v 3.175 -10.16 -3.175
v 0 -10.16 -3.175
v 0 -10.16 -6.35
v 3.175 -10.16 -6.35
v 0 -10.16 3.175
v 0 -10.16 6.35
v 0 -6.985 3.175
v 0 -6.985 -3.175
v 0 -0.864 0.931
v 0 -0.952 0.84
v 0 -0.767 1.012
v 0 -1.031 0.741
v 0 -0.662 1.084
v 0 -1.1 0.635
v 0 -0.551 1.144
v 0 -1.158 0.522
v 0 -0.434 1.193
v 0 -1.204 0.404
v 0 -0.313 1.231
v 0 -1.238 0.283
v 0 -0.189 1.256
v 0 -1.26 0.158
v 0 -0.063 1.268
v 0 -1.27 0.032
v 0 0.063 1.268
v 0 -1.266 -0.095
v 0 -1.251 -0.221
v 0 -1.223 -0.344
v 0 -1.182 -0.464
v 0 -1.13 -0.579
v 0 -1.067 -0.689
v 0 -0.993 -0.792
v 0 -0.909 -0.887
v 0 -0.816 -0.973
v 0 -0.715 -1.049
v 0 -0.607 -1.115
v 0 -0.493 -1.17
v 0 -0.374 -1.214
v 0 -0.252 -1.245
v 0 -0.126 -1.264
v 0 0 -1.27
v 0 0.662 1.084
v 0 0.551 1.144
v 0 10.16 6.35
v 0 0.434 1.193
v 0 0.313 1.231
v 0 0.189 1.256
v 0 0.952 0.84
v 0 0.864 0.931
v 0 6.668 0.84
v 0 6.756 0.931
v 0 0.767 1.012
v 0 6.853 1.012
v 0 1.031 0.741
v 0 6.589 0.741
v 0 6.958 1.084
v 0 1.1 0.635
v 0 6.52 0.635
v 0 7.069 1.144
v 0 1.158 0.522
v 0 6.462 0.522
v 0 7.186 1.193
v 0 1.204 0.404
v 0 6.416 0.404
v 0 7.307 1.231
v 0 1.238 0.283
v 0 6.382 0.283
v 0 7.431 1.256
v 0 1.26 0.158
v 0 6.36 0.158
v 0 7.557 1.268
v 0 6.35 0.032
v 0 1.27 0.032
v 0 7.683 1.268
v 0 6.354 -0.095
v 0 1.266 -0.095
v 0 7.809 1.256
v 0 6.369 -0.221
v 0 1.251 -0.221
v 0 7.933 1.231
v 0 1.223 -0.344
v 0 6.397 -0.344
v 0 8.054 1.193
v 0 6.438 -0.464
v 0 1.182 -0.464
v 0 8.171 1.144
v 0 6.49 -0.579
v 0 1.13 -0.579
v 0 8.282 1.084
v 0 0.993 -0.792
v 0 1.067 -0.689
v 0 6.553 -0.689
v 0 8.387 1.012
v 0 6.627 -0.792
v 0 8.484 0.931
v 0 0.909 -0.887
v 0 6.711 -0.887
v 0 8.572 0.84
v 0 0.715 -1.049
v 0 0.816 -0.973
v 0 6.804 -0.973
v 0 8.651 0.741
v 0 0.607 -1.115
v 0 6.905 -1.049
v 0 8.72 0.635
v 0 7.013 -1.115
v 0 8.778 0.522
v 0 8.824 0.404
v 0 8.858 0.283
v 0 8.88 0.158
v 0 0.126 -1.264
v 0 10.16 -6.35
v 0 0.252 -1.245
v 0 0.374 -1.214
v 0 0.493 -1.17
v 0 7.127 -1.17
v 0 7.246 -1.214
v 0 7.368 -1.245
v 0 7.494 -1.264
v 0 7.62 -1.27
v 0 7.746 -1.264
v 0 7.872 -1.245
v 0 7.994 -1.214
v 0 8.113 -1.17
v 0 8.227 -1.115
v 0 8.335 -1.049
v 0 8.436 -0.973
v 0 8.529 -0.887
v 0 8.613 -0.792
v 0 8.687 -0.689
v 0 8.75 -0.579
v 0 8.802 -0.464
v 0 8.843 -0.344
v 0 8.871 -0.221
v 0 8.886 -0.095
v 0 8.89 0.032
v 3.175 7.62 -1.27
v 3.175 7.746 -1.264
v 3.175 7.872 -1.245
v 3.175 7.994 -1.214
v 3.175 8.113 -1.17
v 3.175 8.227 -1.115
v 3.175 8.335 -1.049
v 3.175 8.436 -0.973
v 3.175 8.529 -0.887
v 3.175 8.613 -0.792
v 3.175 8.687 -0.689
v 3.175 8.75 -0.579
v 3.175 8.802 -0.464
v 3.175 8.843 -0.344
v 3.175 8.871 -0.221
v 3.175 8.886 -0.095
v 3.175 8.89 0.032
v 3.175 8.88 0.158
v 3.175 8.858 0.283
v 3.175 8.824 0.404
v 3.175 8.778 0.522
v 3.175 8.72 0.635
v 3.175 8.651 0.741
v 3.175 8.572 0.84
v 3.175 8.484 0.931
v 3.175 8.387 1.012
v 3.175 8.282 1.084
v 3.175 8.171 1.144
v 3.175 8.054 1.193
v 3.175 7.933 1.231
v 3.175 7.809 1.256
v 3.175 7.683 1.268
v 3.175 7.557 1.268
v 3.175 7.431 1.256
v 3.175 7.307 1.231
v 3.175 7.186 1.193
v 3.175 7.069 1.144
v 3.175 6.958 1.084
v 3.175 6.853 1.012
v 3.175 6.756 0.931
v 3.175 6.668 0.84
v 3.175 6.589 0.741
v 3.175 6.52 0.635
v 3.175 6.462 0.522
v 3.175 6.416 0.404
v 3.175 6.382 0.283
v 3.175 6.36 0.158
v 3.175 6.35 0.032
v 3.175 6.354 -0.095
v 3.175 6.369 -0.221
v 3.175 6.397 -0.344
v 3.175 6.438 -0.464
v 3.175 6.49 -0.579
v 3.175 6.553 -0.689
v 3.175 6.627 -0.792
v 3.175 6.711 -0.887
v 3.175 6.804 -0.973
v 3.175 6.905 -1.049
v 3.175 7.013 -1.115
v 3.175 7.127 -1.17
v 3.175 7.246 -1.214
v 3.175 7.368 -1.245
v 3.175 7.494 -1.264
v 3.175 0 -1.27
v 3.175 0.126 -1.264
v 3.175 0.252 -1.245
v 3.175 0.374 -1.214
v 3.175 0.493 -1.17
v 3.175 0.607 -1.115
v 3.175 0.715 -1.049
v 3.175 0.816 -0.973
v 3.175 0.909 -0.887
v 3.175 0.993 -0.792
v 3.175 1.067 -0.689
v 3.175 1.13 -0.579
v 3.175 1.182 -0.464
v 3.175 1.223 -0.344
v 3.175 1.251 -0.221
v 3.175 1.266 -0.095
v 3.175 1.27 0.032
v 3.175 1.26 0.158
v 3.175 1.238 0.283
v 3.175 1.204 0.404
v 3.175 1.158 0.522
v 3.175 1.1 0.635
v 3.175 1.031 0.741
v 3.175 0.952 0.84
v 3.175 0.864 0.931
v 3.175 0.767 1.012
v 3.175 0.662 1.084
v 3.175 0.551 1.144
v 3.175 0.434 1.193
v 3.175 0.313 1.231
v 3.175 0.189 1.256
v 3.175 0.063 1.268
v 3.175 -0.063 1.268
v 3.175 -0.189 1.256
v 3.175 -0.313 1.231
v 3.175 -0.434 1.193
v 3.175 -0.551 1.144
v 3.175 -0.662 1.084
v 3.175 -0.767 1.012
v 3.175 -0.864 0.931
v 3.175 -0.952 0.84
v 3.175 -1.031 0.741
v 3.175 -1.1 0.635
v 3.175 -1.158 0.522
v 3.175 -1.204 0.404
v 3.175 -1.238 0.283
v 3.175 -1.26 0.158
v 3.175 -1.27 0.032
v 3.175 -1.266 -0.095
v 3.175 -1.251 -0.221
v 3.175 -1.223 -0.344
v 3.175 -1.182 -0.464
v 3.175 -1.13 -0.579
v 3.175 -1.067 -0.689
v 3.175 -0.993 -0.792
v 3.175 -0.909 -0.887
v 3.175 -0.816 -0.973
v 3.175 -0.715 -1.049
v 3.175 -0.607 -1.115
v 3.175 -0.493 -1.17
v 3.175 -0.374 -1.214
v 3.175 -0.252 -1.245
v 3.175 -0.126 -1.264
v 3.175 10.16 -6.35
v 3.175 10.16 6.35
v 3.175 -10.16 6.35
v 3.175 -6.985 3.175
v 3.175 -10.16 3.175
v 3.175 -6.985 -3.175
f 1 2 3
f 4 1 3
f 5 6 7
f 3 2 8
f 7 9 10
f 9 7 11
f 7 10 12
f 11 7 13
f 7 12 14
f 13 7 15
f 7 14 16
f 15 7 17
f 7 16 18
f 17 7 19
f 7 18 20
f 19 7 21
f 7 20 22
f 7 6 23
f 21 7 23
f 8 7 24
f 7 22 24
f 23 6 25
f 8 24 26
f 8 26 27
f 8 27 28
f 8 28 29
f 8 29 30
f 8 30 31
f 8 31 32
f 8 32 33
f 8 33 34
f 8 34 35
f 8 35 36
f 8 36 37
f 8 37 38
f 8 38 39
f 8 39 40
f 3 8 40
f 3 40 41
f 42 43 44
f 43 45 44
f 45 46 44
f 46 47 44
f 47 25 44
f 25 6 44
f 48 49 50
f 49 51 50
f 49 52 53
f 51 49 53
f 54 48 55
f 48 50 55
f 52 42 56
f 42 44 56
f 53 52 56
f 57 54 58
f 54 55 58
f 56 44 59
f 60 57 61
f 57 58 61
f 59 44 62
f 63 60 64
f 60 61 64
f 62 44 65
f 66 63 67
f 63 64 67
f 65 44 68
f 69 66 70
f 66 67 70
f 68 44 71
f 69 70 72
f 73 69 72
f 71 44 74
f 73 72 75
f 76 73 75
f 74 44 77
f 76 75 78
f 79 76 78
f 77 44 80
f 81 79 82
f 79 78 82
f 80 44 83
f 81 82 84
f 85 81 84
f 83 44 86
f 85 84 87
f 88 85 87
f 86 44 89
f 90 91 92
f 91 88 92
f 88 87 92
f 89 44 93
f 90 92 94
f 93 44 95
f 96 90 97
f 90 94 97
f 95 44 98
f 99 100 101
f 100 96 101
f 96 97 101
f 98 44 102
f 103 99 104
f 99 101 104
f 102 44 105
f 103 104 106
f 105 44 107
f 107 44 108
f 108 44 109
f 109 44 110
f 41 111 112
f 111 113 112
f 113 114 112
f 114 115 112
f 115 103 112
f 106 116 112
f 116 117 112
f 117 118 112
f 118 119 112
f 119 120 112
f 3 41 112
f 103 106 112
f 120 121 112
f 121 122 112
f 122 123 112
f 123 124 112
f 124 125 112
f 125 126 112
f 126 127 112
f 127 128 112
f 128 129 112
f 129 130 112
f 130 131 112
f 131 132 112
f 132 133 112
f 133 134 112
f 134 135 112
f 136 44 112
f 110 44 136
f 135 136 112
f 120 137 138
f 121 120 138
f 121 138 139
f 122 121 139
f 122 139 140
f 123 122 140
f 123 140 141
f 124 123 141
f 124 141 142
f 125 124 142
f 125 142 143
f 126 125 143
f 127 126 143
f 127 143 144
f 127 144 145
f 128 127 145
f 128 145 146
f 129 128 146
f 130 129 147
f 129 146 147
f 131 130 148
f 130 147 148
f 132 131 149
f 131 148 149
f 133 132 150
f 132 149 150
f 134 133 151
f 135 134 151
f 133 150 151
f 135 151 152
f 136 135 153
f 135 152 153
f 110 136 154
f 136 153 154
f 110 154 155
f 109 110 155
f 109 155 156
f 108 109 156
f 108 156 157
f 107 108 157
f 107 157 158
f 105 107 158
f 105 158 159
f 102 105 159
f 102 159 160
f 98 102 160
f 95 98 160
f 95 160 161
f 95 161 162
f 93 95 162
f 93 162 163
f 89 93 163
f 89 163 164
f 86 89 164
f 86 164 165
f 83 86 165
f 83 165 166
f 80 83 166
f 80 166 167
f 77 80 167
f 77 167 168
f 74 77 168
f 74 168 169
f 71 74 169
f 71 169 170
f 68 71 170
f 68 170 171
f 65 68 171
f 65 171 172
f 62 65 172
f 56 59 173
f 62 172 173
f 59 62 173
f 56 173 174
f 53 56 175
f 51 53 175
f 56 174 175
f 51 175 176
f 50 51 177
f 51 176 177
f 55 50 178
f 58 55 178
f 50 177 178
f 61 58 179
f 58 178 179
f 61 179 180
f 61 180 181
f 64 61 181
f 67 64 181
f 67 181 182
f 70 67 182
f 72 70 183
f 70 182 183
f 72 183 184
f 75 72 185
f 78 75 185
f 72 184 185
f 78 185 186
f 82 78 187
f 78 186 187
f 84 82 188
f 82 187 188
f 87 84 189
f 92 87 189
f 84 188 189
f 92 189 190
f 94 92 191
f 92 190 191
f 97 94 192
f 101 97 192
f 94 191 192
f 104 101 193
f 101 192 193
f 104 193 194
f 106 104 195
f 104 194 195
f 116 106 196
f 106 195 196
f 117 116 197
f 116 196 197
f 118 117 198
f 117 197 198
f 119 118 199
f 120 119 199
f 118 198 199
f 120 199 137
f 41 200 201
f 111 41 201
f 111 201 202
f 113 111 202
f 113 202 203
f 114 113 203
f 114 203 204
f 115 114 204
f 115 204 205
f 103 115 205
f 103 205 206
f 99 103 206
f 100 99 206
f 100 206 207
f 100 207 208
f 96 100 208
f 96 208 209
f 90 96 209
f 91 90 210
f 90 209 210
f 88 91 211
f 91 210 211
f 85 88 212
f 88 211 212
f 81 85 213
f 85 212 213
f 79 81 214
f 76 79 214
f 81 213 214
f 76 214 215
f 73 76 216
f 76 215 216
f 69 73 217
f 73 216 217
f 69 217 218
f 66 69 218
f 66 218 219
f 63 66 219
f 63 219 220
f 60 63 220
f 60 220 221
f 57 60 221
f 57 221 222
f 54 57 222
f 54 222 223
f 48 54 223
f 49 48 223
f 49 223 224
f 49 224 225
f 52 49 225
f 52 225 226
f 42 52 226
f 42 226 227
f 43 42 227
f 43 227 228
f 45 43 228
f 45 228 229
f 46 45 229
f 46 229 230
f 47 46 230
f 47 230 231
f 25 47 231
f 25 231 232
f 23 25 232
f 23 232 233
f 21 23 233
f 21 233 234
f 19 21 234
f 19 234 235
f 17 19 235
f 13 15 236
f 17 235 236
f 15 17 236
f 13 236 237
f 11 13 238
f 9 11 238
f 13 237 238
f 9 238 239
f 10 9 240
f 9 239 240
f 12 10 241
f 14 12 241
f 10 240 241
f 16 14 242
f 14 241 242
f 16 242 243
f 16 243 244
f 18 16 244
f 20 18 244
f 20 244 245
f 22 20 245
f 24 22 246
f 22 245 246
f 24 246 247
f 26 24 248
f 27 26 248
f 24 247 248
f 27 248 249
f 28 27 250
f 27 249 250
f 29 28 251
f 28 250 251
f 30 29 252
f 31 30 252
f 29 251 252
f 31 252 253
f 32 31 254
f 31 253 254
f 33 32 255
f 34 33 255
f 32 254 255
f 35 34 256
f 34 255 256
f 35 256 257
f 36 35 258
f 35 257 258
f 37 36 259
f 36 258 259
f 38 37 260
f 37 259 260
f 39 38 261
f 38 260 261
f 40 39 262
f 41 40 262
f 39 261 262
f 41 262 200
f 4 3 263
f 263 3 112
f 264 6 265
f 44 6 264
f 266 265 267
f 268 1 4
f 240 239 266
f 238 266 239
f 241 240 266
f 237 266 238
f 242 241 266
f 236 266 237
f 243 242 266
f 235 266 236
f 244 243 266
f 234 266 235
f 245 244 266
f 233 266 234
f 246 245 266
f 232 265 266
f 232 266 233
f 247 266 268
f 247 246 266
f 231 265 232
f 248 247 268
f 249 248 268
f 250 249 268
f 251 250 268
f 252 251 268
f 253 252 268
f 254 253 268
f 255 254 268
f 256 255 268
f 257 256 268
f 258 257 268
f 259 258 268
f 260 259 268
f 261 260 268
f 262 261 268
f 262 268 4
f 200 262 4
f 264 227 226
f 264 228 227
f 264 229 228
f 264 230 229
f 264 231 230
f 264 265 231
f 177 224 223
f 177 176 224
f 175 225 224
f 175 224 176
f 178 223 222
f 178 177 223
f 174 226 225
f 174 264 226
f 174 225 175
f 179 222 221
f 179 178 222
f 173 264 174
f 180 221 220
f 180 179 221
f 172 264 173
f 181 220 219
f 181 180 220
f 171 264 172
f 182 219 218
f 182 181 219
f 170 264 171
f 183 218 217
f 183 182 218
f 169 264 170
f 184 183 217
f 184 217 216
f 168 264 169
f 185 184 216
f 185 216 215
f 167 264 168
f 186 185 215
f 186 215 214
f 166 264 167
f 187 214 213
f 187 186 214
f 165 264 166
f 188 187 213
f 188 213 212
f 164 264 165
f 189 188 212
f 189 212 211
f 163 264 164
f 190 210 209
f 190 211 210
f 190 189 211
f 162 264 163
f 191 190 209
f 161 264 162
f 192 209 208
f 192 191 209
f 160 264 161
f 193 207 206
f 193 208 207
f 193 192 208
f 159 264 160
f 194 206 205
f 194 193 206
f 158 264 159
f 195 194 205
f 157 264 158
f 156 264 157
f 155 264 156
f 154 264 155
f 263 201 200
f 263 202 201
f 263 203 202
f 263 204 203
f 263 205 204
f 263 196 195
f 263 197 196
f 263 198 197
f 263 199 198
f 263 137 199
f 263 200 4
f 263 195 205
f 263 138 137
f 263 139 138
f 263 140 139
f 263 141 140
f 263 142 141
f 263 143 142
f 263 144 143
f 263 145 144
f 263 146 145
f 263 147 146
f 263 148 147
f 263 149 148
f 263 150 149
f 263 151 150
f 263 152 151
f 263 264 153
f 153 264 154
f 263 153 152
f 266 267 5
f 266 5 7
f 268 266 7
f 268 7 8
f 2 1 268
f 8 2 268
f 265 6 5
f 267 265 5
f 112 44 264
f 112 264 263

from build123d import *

# Parameters (mm, degrees)
SKETCH1_W           = 12.7
SKETCH1_H           = 20.32
BOSS_EXTRUDE1_DEPTH = 3.175
SKETCH2_W           = 6.35
SKETCH2_H           = 3.175
CUT_EXTRUDE1_DEPTH  = 4.175
SKETCH3_R           = 1.27
CUT_EXTRUDE2_DEPTH  = 4.175


with BuildPart() as part:
    # Sketch1 → Boss-Extrude1 (new body)
    with BuildSketch(Plane(origin=(0, 0, 0), x_dir=(0, 0, -1), z_dir=(1, 0, 0))):
        Rectangle(SKETCH1_W, SKETCH1_H)
    extrude(amount=BOSS_EXTRUDE1_DEPTH)

    # Sketch2 → Cut-Extrude1 (cut, through all)
    with BuildSketch(Plane(origin=(3.175, 0, 0), x_dir=(0, 0, -1), z_dir=(1, 0, 0))):
        with Locations((0, -8.5725)):
            Rectangle(SKETCH2_W, SKETCH2_H)
    extrude(amount=-CUT_EXTRUDE1_DEPTH, mode=Mode.SUBTRACT)

    # Sketch3 → Cut-Extrude2 (cut, through all)
    with BuildSketch(Plane(origin=(3.175, 0, 0), x_dir=(0, 0, -1), z_dir=(1, 0, 0))):
        Circle(SKETCH3_R)
        with Locations((0, 7.62)):
            Circle(SKETCH3_R)
    extrude(amount=-CUT_EXTRUDE2_DEPTH, mode=Mode.SUBTRACT)


solid = part.part
